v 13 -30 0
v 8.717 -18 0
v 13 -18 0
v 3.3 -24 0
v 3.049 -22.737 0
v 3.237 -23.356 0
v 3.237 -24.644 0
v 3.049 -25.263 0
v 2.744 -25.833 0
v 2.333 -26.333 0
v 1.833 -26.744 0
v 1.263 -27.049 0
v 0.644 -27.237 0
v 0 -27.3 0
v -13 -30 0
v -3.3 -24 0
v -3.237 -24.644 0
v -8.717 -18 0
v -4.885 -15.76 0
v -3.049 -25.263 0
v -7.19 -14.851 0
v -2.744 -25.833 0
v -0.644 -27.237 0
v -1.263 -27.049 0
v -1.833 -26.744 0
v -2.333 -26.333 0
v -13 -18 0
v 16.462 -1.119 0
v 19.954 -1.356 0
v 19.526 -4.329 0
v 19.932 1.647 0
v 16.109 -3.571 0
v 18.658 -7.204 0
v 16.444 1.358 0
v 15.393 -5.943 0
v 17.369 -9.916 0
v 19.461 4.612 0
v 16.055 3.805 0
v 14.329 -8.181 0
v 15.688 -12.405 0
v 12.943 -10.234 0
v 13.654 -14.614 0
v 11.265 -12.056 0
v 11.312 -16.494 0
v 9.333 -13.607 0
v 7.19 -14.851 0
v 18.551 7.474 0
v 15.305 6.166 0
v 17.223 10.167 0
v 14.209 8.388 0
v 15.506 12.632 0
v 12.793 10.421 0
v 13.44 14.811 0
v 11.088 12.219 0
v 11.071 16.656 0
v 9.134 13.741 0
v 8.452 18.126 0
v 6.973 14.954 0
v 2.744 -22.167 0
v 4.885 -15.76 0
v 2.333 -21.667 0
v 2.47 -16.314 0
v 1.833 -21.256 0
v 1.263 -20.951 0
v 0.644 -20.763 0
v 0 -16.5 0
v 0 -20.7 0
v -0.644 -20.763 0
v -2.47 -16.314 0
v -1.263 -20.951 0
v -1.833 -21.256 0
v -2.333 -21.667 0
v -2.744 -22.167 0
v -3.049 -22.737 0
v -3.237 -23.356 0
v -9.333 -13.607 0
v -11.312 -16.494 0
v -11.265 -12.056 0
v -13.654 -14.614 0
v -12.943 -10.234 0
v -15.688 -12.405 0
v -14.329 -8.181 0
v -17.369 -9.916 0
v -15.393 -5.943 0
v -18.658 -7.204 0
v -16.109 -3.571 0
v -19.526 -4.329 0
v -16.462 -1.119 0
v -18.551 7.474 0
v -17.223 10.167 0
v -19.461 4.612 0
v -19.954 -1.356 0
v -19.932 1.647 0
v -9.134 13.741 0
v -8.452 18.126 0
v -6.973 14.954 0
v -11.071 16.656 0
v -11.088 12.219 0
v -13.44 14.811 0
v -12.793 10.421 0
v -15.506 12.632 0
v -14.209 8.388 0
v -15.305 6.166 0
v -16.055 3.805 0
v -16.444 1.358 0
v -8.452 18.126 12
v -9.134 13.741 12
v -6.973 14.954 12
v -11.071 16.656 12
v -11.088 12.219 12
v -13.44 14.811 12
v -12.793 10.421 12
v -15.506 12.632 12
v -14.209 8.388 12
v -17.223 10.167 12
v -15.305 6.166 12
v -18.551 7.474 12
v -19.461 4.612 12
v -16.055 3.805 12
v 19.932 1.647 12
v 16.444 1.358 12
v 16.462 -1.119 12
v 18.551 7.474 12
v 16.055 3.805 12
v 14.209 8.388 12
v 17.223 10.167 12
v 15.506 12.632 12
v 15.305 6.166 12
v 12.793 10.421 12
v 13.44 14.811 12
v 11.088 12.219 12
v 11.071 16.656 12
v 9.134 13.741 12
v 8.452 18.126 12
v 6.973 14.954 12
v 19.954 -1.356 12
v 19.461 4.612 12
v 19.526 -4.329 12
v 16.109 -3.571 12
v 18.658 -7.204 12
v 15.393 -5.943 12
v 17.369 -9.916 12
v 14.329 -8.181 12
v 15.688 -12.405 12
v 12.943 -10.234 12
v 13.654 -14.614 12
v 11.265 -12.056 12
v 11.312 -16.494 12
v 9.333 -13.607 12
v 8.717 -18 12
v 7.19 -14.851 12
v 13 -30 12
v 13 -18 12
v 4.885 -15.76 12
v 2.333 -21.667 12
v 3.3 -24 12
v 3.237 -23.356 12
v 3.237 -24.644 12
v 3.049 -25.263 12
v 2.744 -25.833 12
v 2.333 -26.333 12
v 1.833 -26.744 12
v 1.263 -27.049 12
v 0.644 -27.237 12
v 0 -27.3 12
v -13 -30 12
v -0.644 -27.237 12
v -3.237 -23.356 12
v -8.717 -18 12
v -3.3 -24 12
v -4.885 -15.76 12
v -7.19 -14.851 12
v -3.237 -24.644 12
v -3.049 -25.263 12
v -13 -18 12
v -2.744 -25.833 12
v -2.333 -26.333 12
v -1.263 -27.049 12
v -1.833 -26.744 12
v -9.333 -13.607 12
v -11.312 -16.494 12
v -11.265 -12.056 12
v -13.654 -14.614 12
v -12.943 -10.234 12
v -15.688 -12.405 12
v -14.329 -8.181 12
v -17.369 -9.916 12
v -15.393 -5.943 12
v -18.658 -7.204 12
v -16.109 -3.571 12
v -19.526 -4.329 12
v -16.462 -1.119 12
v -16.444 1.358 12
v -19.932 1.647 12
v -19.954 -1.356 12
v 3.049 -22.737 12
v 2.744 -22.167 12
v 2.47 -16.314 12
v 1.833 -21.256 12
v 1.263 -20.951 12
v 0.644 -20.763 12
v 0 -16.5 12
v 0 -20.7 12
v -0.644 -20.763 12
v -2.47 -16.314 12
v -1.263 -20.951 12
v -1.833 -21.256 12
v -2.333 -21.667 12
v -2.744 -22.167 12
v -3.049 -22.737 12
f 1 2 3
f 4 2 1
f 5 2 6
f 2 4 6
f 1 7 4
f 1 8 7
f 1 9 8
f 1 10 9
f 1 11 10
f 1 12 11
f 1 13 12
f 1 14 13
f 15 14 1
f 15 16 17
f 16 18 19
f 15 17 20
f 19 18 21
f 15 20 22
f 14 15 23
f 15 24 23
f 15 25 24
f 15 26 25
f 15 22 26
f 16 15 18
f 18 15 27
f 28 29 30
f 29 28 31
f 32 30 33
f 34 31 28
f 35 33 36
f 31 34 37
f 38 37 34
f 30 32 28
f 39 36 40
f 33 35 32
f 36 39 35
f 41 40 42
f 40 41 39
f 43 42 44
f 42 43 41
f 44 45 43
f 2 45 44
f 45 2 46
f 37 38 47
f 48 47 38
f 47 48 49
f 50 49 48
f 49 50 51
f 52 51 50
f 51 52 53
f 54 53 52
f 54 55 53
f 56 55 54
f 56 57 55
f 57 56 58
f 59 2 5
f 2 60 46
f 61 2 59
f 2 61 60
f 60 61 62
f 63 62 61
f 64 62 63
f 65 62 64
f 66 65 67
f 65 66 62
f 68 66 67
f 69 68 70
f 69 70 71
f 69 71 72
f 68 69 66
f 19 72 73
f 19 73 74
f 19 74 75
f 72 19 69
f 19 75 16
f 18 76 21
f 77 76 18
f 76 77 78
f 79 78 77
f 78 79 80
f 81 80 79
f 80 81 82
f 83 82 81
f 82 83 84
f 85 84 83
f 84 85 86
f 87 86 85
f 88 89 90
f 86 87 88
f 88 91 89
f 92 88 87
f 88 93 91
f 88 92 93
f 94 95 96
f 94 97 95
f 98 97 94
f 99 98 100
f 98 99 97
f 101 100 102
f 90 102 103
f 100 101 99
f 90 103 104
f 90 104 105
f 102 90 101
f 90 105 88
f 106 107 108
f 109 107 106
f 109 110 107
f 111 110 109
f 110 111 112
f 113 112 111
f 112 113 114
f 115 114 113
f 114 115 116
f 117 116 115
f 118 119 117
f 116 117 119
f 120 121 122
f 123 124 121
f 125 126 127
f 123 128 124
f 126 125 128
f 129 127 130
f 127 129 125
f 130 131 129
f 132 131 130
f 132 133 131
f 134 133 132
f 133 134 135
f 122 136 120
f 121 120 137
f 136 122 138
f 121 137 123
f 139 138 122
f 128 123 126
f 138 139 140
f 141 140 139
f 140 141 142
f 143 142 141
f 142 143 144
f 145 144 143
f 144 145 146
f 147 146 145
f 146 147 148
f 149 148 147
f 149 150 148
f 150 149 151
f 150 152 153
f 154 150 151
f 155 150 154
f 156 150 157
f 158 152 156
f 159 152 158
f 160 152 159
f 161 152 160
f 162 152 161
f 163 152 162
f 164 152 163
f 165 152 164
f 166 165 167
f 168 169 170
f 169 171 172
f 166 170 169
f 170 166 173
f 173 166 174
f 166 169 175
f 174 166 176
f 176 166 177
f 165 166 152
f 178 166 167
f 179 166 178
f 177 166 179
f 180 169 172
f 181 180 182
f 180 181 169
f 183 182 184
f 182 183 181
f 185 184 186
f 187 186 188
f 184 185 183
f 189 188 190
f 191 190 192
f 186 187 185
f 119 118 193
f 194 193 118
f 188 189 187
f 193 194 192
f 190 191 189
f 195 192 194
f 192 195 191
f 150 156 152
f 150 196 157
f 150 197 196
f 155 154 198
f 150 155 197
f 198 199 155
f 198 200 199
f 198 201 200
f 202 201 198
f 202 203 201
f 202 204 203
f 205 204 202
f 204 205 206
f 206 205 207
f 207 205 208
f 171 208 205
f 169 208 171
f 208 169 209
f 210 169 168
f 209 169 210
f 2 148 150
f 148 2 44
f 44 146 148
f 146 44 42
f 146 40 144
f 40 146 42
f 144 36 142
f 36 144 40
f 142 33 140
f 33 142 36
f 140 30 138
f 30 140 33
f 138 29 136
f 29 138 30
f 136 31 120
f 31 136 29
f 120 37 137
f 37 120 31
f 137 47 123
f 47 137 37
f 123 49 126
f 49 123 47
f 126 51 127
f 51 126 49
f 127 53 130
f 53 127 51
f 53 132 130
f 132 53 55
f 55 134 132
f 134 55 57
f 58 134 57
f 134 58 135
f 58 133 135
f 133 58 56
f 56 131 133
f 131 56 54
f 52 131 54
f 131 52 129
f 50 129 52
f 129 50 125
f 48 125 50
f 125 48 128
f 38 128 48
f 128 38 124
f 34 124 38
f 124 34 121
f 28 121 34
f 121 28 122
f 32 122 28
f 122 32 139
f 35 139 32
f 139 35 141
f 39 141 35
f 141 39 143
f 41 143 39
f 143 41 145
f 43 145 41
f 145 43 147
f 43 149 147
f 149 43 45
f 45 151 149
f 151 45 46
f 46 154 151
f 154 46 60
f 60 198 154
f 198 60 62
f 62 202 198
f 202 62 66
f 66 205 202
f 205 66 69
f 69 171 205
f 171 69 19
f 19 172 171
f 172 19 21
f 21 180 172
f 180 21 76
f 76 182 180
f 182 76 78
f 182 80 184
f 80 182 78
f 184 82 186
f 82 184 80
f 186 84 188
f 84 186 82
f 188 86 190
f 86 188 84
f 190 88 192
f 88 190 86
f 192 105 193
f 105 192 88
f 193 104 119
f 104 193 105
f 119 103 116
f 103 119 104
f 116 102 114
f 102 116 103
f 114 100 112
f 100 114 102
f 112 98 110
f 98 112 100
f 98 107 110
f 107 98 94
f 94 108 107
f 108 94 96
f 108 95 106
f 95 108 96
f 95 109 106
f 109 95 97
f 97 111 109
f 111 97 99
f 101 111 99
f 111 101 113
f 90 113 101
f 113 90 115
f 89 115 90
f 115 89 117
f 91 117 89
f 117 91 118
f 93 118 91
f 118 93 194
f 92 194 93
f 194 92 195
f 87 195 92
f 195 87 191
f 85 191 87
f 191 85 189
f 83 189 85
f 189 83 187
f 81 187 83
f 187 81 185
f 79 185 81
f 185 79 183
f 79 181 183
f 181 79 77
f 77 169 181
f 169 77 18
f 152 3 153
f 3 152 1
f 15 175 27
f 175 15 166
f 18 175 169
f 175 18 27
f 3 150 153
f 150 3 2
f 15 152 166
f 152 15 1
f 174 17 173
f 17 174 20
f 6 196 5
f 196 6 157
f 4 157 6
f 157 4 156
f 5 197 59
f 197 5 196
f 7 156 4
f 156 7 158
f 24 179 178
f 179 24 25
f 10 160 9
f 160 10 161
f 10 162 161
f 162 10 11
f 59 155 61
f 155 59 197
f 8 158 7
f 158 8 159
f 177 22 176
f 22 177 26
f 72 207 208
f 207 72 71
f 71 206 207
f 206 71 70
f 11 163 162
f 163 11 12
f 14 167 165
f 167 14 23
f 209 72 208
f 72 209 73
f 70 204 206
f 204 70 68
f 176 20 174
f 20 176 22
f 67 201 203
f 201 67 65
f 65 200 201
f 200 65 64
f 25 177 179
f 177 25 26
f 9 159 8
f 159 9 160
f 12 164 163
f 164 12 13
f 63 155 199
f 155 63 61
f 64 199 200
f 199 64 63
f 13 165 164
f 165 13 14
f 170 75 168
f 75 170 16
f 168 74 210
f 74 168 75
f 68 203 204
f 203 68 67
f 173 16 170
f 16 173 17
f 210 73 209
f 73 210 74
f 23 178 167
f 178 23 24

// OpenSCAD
$fn = 32;

// ----------------------------------------------------------------------
// Spring clip: 40 mm outside, 3.5 mm band, 50 degree opening
// ----------------------------------------------------------------------

// --- parameters (mm) ---
outer_r = 20;             // clip outside radius
inner_r = 16.5;           // clip bore radius
band = 3.5;               // band thickness
clip_w = 12;              // clip width
opening = 50;             // opening angle
tab_w = 26;               // tab width
tab_len = 10;             // tab length past the clip
tab_hole = 6.6;           // tab fixing hole

clip_profile = [[-8.452, 18.126], [-11.071, 16.656], [-13.44, 14.811], [-15.506, 12.632], [-17.223, 10.167], [-18.551, 7.474], [-19.461, 4.612], [-19.932, 1.647], [-19.954, -1.356], [-19.526, -4.329], [-18.658, -7.204], [-17.369, -9.916], [-15.688, -12.405], [-13.654, -14.614], [-11.312, -16.494], [-8.715, -18.001], [-5.922, -19.103], [-2.995, -19.775], [0, -20], [2.995, -19.775], [5.922, -19.103], [8.715, -18.001], [11.312, -16.494], [13.654, -14.614], [15.688, -12.405], [17.369, -9.916], [18.658, -7.204], [19.526, -4.329], [19.954, -1.356], [19.932, 1.647], [19.461, 4.612], [18.551, 7.474], [17.223, 10.167], [15.506, 12.632], [13.44, 14.811], [11.071, 16.656], [8.452, 18.126], [6.973, 14.954], [9.134, 13.741], [11.088, 12.219], [12.793, 10.421], [14.209, 8.388], [15.305, 6.166], [16.055, 3.805], [16.444, 1.358], [16.462, -1.119], [16.109, -3.571], [15.393, -5.943], [14.329, -8.181], [12.943, -10.234], [11.265, -12.056], [9.333, -13.607], [7.19, -14.851], [4.885, -15.76], [2.47, -16.314], [0, -16.5], [-2.47, -16.314], [-4.885, -15.76], [-7.19, -14.851], [-9.333, -13.607], [-11.265, -12.056], [-12.943, -10.234], [-14.329, -8.181], [-15.393, -5.943], [-16.109, -3.571], [-16.462, -1.119], [-16.444, 1.358], [-16.055, 3.805], [-15.305, 6.166], [-14.209, 8.388], [-12.793, 10.421], [-11.088, 12.219], [-9.134, 13.741], [-6.973, 14.954]];

difference() {
  union() {
    linear_extrude(height = clip_w) polygon(clip_profile);
    /* mounting tab, sunk 2 mm into the band */
    translate([-13, -30, 0]) cube([tab_w, 12, clip_w]);
  }
  translate([0, -24, -2.5]) cylinder(h = clip_w + 5, d = tab_hole);
}
